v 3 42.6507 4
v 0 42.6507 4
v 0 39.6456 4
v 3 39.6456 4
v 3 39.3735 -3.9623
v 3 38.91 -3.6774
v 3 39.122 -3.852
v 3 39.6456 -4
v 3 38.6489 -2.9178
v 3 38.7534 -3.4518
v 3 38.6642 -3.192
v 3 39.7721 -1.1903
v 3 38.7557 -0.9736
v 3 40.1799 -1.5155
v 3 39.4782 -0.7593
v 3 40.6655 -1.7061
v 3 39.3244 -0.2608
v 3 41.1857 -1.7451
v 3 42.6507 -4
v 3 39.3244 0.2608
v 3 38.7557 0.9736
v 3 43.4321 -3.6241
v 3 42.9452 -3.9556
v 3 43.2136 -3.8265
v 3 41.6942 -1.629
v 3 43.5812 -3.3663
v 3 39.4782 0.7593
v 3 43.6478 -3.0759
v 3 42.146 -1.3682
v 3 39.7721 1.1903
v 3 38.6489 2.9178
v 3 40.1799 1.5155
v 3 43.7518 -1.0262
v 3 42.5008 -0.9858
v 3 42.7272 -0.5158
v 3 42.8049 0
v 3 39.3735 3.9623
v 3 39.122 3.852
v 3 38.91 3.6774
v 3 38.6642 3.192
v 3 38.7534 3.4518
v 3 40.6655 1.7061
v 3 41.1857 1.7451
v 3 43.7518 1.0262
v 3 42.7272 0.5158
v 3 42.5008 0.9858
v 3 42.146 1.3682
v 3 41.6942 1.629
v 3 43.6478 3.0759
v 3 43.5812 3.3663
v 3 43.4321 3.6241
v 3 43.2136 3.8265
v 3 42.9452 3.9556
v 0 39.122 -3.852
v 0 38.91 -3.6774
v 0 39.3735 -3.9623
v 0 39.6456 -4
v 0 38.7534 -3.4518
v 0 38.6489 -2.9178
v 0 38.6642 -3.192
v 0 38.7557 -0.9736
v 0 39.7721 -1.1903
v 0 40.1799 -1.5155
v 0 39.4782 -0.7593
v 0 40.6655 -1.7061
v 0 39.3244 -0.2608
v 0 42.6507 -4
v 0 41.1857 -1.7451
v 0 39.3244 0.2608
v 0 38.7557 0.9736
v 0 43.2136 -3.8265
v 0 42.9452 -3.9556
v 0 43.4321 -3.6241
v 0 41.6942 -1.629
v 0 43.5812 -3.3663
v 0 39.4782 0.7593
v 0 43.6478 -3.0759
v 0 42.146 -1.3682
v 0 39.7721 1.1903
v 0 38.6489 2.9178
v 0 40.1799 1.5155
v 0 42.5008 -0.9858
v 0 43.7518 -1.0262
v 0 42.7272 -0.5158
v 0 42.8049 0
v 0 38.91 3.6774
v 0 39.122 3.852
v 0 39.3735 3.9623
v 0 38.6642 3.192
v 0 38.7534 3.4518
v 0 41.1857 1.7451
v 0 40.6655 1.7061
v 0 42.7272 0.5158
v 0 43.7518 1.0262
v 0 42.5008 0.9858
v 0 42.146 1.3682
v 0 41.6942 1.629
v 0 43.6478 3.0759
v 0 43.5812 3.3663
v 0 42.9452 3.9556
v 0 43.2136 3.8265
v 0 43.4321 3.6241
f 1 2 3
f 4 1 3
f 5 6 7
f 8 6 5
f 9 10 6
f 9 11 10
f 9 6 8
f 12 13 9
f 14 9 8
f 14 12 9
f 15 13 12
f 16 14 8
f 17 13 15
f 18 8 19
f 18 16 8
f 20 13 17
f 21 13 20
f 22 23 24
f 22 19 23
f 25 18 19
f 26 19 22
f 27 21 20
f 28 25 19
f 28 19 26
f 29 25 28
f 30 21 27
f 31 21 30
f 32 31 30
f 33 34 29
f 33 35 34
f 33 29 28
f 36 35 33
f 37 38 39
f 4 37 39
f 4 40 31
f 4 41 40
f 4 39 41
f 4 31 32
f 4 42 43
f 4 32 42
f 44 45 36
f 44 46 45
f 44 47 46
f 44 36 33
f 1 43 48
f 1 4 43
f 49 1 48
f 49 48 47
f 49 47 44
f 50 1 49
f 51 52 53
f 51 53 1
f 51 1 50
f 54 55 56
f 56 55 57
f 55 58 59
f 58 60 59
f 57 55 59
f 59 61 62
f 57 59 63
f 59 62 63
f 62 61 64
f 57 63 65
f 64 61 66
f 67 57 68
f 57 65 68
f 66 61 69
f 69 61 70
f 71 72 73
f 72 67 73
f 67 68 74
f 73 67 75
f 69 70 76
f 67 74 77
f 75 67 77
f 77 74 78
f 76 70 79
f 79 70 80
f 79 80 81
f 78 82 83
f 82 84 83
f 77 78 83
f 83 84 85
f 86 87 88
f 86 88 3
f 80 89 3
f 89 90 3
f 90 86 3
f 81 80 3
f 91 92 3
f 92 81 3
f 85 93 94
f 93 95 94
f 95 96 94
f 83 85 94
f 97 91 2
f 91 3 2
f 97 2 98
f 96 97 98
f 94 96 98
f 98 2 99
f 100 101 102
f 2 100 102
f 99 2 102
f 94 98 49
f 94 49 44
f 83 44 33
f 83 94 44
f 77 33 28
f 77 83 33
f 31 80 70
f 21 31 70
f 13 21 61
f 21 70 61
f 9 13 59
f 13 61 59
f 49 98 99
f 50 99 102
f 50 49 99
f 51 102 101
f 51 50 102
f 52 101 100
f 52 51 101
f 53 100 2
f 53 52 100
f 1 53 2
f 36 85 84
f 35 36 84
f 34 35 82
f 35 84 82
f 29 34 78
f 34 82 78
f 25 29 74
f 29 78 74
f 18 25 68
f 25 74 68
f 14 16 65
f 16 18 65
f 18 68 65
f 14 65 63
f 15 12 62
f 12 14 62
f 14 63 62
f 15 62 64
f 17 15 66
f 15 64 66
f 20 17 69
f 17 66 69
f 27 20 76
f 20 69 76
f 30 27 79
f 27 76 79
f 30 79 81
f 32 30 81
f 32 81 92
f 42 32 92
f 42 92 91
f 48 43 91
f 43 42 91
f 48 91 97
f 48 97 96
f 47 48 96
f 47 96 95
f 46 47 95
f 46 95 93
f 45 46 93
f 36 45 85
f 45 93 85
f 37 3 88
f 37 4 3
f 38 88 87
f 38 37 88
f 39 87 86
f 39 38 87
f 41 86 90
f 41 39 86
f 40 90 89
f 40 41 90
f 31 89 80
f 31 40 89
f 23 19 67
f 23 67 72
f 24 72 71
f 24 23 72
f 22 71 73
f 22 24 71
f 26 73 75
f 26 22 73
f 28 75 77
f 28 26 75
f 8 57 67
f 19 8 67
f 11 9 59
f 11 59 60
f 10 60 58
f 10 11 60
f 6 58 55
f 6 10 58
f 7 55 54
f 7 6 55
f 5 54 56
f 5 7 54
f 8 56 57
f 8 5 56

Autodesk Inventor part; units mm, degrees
ref_plane "YZ Plane" through (0, 0, 0) normal (1, 0, 0) x (0, 1, 0)
ref_plane "XZ Plane" through (0, 0, 0) normal (0, 1, 0) x (-1, 0, 0)
ref_plane "XY Plane" through (0, 0, 0) normal (0, 0, 1) x (1, 0, 0)
sketch "Sketch1" plane through (0, 0, 0) normal (1, 0, 0) x (0, 1, 0)
  circle A0 centre (0, 0) radius 43.75 construction
  circle A1 centre (0, 0) radius 38.75 construction
  line L0 (48.236, 0) -> (48.236, 4) construction
  line L1 (48.236, 0) -> (48.236, -4) construction
  arc A2 (43.5668, -4) -> (43.5668, 4) centre (0, 0) ccw construction
  arc A3 (38.543, -4) -> (38.543, 4) centre (0, 0) ccw construction
  line L2 (43.5668, 4) -> (38.543, 4)
  line L3 (38.543, -4) -> (43.5668, -4)
  arc A4 (38.543, -4) -> (38.543, 4) centre (3.2648, 0) ccw
  arc A5 (43.5668, -4) -> (43.5668, 4) centre (3.2648, 0) ccw
  line L4 (38.769, 0) -> (43.7648, 0) construction
  line L5 (41.0549, 4) -> (41.0549, -4) construction
  circle A6 centre (41.0549, 0) radius 1.75 construction
  circle A7 centre (41.0549, 0) radius 1.75
  dimension "d0" = 87.5
  dimension "d1" = 77.5
  dimension "d2" = 4
  dimension "d3" = 4
  dimension "d4" = 3.5
  dimension "d5" = 3.5
  dimension "d6" = 40.5
  dimension "d7" = 7.1811
  dimension "d8" = 4
  dimension "d9" = 4
extrude "Extrusion2" add sketch "Sketch1" along normal blind 3
fillet "Fillet2" radius 1 4 edges at (1.5, 43.5668, -4) (1.5, 43.5668, 4) (1.5, 38.543, 4) (1.5, 38.543, -4)
properties part number "Reverse Gear Link Block" material "PVC-Piping"
